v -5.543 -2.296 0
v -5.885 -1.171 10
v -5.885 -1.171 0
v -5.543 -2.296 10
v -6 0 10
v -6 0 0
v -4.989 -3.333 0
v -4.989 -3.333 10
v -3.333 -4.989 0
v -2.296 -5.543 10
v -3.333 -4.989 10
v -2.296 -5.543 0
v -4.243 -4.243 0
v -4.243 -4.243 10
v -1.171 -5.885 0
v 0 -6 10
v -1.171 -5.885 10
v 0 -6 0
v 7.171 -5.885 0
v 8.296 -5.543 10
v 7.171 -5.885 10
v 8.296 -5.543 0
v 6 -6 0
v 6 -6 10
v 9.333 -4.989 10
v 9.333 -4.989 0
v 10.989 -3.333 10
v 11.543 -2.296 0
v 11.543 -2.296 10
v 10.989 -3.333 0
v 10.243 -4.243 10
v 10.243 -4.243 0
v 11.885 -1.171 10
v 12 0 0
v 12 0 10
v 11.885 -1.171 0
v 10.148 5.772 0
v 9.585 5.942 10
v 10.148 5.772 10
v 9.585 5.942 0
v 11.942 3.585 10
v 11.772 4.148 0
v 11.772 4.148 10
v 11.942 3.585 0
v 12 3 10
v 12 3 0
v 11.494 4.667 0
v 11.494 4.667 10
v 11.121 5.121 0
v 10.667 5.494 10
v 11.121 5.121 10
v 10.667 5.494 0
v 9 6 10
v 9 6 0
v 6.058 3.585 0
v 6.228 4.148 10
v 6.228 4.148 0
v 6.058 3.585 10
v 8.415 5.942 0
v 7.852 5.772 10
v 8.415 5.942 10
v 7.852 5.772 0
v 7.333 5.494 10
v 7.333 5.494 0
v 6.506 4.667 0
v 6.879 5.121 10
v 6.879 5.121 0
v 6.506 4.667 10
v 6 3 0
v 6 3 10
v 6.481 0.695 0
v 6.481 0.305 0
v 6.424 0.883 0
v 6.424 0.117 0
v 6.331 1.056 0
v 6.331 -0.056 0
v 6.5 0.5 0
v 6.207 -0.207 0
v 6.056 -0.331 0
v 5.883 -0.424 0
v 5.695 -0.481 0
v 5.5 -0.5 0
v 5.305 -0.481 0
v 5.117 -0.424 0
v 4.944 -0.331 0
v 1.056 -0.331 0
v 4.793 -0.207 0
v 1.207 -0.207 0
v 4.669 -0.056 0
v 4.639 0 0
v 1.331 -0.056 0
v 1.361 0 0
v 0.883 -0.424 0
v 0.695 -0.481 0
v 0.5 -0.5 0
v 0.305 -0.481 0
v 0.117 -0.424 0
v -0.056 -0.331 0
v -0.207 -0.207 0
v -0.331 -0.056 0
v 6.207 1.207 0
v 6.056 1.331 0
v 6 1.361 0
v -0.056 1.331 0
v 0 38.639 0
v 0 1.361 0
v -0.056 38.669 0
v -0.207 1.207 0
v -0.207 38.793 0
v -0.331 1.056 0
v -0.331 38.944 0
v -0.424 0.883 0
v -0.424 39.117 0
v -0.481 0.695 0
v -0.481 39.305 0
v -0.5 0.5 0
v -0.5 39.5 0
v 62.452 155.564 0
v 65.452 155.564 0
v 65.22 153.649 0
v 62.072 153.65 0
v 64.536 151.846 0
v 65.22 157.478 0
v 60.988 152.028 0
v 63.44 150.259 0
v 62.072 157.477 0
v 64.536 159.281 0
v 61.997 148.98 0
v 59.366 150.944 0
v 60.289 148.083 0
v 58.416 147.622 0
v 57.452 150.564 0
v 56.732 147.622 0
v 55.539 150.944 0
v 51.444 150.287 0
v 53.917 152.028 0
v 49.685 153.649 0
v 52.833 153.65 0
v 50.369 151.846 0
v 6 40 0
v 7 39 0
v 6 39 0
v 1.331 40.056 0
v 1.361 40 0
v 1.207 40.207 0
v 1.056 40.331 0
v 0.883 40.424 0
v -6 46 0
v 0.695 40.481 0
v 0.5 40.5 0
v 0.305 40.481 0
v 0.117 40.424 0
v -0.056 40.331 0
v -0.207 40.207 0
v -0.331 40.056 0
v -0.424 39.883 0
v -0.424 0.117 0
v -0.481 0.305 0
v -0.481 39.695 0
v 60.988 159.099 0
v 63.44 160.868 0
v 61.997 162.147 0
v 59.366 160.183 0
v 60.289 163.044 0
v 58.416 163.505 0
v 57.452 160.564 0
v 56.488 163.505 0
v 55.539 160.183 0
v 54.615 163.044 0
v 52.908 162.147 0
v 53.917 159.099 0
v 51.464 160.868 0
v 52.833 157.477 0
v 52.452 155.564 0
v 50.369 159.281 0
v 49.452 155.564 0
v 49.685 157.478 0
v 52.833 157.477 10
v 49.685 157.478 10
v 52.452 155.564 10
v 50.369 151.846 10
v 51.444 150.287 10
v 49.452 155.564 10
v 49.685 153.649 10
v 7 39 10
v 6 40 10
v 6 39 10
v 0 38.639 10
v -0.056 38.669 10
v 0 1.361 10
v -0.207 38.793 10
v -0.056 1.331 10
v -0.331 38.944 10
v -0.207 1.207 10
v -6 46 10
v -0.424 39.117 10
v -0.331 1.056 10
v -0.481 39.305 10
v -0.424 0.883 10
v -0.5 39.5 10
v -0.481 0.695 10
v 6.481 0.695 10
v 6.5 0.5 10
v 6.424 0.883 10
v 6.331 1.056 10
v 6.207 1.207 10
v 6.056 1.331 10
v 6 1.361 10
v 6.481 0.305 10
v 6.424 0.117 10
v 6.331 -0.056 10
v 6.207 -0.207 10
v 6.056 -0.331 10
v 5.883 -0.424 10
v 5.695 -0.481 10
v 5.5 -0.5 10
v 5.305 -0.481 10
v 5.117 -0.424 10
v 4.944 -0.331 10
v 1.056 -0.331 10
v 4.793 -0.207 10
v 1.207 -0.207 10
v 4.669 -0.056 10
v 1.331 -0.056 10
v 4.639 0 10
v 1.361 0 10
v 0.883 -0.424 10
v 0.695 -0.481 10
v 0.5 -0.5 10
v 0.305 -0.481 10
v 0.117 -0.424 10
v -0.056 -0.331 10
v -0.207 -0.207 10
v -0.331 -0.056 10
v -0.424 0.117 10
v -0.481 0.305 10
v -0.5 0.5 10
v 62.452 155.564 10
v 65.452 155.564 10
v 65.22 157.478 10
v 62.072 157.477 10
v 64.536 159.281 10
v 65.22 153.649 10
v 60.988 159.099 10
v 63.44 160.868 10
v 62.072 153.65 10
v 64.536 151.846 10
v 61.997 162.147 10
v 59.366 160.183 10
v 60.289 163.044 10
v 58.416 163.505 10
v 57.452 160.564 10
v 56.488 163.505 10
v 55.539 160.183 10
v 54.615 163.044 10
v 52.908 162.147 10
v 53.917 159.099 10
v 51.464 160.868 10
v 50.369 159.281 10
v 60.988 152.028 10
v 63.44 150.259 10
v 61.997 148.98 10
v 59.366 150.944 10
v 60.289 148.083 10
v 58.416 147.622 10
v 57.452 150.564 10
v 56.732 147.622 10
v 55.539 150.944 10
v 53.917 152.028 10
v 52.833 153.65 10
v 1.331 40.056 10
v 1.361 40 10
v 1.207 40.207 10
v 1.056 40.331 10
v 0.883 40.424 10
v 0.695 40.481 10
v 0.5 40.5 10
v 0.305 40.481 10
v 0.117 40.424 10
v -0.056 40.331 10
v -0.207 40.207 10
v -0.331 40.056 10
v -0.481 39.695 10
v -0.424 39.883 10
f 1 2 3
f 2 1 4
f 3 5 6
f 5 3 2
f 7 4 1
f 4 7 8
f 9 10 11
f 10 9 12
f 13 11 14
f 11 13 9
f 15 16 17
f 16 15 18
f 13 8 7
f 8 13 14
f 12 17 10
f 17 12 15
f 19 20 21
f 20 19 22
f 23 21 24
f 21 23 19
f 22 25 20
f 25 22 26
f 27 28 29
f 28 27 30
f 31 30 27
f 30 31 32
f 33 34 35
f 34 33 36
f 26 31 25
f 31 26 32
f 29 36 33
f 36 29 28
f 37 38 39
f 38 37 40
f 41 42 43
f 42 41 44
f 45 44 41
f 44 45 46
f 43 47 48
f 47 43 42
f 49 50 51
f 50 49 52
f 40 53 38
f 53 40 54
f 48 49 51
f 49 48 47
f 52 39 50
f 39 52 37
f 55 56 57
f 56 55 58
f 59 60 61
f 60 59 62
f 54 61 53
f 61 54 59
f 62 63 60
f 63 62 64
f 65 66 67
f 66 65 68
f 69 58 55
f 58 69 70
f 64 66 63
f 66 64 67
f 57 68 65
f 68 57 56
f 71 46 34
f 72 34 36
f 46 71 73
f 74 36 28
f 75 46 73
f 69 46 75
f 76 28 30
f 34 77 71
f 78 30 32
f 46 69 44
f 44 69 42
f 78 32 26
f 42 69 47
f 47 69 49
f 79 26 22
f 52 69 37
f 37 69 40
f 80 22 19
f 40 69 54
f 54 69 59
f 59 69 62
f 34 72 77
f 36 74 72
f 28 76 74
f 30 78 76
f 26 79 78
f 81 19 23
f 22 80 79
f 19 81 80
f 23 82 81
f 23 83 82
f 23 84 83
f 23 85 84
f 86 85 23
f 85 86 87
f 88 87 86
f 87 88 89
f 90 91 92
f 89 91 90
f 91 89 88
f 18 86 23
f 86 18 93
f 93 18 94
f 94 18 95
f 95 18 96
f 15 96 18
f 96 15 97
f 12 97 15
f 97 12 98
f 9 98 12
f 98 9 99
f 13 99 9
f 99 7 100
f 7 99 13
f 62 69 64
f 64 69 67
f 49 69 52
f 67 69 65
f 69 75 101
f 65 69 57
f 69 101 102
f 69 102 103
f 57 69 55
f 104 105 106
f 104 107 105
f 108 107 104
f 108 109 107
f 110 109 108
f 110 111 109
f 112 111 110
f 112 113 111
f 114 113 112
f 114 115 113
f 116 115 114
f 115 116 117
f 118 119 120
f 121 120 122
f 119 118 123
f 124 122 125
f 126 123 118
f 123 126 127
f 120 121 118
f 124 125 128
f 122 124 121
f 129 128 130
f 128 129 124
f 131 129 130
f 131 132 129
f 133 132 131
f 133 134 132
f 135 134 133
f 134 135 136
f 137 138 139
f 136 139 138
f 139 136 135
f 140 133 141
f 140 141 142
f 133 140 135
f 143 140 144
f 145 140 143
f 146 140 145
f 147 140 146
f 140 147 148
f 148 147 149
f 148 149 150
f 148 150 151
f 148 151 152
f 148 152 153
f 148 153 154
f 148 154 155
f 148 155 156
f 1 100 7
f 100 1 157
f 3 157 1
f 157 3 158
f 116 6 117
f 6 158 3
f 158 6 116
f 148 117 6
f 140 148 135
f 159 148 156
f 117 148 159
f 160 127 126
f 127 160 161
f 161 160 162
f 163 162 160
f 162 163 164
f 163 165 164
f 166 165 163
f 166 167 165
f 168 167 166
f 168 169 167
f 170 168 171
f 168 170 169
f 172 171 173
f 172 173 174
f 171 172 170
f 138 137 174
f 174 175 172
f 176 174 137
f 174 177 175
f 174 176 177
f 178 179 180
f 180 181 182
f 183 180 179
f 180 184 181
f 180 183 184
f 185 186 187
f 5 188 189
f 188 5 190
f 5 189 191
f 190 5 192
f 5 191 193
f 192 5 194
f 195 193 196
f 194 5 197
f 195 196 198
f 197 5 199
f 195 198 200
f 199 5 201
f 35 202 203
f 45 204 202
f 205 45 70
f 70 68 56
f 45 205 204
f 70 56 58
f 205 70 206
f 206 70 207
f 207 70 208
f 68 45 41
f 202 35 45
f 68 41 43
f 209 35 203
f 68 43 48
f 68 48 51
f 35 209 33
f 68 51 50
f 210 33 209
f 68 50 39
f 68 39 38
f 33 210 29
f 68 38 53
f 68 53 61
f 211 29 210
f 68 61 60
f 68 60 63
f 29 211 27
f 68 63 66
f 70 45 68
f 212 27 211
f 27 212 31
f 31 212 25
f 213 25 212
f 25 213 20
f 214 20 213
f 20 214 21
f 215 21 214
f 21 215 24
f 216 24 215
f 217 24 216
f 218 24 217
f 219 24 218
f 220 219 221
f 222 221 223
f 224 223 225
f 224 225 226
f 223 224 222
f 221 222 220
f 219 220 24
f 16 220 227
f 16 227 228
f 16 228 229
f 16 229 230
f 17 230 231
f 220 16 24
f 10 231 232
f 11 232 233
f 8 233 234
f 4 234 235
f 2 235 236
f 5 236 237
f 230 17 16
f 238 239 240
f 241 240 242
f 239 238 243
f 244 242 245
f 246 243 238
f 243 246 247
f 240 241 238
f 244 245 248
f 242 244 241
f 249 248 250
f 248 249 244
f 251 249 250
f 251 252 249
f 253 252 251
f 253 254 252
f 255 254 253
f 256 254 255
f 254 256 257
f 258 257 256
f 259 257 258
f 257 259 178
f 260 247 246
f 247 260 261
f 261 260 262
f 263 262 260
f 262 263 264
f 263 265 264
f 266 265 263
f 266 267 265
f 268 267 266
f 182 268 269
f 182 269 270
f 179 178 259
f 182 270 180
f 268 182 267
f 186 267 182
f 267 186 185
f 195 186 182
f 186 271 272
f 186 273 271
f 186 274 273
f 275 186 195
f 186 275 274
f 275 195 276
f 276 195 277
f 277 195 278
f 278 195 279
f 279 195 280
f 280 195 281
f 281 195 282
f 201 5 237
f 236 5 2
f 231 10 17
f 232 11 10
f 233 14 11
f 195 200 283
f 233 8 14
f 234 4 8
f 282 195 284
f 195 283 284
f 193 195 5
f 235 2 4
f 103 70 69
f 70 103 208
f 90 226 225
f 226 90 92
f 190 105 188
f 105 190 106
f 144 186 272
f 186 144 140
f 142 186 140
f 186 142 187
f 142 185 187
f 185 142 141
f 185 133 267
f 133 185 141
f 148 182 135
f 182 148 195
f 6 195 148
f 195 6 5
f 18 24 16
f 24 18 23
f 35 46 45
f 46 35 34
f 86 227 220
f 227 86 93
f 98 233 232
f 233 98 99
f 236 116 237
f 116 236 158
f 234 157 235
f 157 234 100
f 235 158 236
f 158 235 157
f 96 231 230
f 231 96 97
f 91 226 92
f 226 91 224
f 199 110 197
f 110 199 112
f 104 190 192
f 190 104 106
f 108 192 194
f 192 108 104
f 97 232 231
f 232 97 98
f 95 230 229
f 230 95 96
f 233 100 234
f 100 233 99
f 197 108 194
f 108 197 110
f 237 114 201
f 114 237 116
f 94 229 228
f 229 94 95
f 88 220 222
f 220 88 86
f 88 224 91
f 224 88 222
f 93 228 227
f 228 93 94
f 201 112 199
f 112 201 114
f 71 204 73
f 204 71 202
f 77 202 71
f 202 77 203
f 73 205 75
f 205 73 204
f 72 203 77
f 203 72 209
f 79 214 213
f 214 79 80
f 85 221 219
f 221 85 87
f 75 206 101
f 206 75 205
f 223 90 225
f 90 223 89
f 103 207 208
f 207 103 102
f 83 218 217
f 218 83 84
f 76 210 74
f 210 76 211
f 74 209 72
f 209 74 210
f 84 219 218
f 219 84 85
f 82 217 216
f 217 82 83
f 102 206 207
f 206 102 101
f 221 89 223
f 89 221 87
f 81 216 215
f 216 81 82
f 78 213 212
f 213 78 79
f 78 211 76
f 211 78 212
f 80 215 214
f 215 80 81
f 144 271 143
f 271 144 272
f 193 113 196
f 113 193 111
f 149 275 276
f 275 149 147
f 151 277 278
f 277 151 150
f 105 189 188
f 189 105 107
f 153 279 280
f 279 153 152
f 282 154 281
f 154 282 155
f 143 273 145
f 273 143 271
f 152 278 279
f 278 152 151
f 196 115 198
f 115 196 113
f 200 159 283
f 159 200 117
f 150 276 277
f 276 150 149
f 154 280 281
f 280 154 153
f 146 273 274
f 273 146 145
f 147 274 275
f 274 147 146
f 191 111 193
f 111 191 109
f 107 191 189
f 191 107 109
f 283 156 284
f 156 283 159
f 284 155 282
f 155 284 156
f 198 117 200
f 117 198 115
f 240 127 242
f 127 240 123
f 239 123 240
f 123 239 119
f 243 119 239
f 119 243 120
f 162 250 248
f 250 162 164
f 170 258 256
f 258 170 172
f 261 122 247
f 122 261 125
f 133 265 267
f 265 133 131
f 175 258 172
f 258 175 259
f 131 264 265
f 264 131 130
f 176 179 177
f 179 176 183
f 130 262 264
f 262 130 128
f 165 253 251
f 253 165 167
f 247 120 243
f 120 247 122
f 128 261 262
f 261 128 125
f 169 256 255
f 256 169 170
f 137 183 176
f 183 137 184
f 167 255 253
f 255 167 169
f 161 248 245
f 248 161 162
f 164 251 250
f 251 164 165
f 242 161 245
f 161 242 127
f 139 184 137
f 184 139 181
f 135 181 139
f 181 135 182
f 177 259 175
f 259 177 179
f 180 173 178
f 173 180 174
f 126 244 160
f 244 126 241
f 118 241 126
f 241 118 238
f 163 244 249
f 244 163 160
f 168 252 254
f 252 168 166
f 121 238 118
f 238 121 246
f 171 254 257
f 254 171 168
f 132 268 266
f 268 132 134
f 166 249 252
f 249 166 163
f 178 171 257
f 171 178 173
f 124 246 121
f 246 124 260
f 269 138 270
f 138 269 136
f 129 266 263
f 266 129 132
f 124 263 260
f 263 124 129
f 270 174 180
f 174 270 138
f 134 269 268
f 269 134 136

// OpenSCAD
/*Filament spool holder By Jkk79
*/

// preview[view:south, tilt:top]

// Holder type... Well, you're going to get all the types as STL's, no matter what you choose here, just ignore the ones you dont need.
part="hole"; // [left:Left side with pin, right:Right side with pin,hole:Just a hole for bolt]

//Spool diameter.
spoolDiam=200; 

//Spool center hole diameter.
SpoolCenterHoleDiam=53; 

//Frame thickness, 6mm default, change this if you have something else and feel adventurous.
frameThickness=6;

//Frame upper part height, 40mm default, change this if you have something else and feel adventurous.
frameHeight=40;

//Mount's thickness, I dont know how sturdy it will be below 6mm. Reduce if extruder can't fit past them at max printing heights.
mountThickness=6;//[2,3,4,5,6]

//Holder's "hook's" length.
hookLenght=6;// [1,2,3,4,5,6,7,8,9,10]

//The angle of the arm. 66 seems to work well.
angle=66; //[40:80]

//Thickness of the holder. 10mm seems to work well.
holderThickness=10; 

//Diameter of the pin, or the hole. 8,5mm for 8mm bolt?
pinWidth=10;

/*[For pin type holder only]*/
//Height of the pin.
pin1Height=10; 

//Height of the second part of the pin that sits on top of the first pin.
pin2Height=10; 

//Width of the top of the second part of the pin, you can make it a cone shape, so the spool won't fall off even if either side fails for any reason.
pin2TopWidth=29; //29

//-----------
spoolCenterX=cos(angle)*((spoolDiam/2)+(SpoolCenterHoleDiam/2))+frameThickness; //calculates the X-coordinate.
spoolCenterY=sin(angle)*((spoolDiam/2)+(SpoolCenterHoleDiam/2))+frameHeight;    //and the Y-coordinate.

module print_part(){
    if(part=="left"){
        holder(); 
        translate([spoolCenterX,spoolCenterY,0])cylinder(holderThickness+pin1Height,pinWidth/2,pinWidth/2);
        translate([spoolCenterX,spoolCenterY,holderThickness+pin1Height])cylinder(pin2Height,pinWidth/2,pin2TopWidth/2);
        translate([0,0,-1])%spoolShape();
    } 
    else if(part=="right"){
        mirror([1,0,0])translate([0,0,0]){
            holder();
            translate([spoolCenterX,spoolCenterY,0])cylinder(holderThickness+pin1Height,pinWidth/2,pinWidth/2);
            translate([spoolCenterX,spoolCenterY,holderThickness+pin1Height])cylinder(pin2Height,pinWidth/2,pin2TopWidth/2);
            translate([0,0,-1])%spoolShape();
        }
    }
    else if(part=="hole"){    
        difference(){
            union(){
                holder();
                translate([spoolCenterX,spoolCenterY,0])cylinder(holderThickness,3+pinWidth/2,3+pinWidth/2);
            }
            translate([spoolCenterX,spoolCenterY,-1])cylinder(holderThickness+2,pinWidth/2,pinWidth/2);
        }
        translate([0,0,-1])%spoolShape();
    }
}

module spoolShape(){
    difference(){
            translate([spoolCenterX,spoolCenterY+pinWidth/2-SpoolCenterHoleDiam/2,0])cylinder(1,spoolDiam/2,spoolDiam/2);
            translate([spoolCenterX,spoolCenterY+pinWidth/2-SpoolCenterHoleDiam/2,-1])cylinder(3,SpoolCenterHoleDiam/2,SpoolCenterHoleDiam/2);
    }
}

module rounding(r,angle){ 
     rotate([0,0,angle]){
        difference(){
                translate([-r,-r,-1])cube([r+1,r+1,holderThickness+2]);
                translate([-r,-r,-1])cylinder(holderThickness+2,r,r,$fn=32);
        }
    }
}

module holder(){ 
    difference(){
        linear_extrude(height=holderThickness, convexity=10)polygon(points=[[0,0],[frameThickness,0],[frameThickness,hookLenght],[frameThickness+mountThickness,hookLenght],[frameThickness+mountThickness,-mountThickness],[-mountThickness,-mountThickness],[-mountThickness,frameHeight+mountThickness],[spoolCenterX-2,spoolCenterY+2],[spoolCenterX+2,spoolCenterY-2],[frameThickness+1,frameHeight-1],[frameThickness,frameHeight-1],[frameThickness,frameHeight],[0,frameHeight]]);
        translate([-mountThickness,-mountThickness,0])rounding(mountThickness,180);
        translate([frameThickness+mountThickness,-mountThickness,0])rounding(mountThickness,-90);
        translate([frameThickness+mountThickness,hookLenght,0])rounding(mountThickness/2,0);
        translate([frameThickness,hookLenght,0])rounding(mountThickness/2,90);
        translate([mountThickness/12,mountThickness/12,-1])cylinder(holderThickness+2,mountThickness/6,mountThickness/6,$fn=32);
        translate([frameThickness-mountThickness/12,mountThickness/12,-1])cylinder(holderThickness+2,mountThickness/6,mountThickness/6,$fn=32);
        translate([mountThickness/12,frameHeight-mountThickness/12,-1])cylinder(holderThickness+2,mountThickness/6,mountThickness/6,$fn=32);
    }
}

print_part();

